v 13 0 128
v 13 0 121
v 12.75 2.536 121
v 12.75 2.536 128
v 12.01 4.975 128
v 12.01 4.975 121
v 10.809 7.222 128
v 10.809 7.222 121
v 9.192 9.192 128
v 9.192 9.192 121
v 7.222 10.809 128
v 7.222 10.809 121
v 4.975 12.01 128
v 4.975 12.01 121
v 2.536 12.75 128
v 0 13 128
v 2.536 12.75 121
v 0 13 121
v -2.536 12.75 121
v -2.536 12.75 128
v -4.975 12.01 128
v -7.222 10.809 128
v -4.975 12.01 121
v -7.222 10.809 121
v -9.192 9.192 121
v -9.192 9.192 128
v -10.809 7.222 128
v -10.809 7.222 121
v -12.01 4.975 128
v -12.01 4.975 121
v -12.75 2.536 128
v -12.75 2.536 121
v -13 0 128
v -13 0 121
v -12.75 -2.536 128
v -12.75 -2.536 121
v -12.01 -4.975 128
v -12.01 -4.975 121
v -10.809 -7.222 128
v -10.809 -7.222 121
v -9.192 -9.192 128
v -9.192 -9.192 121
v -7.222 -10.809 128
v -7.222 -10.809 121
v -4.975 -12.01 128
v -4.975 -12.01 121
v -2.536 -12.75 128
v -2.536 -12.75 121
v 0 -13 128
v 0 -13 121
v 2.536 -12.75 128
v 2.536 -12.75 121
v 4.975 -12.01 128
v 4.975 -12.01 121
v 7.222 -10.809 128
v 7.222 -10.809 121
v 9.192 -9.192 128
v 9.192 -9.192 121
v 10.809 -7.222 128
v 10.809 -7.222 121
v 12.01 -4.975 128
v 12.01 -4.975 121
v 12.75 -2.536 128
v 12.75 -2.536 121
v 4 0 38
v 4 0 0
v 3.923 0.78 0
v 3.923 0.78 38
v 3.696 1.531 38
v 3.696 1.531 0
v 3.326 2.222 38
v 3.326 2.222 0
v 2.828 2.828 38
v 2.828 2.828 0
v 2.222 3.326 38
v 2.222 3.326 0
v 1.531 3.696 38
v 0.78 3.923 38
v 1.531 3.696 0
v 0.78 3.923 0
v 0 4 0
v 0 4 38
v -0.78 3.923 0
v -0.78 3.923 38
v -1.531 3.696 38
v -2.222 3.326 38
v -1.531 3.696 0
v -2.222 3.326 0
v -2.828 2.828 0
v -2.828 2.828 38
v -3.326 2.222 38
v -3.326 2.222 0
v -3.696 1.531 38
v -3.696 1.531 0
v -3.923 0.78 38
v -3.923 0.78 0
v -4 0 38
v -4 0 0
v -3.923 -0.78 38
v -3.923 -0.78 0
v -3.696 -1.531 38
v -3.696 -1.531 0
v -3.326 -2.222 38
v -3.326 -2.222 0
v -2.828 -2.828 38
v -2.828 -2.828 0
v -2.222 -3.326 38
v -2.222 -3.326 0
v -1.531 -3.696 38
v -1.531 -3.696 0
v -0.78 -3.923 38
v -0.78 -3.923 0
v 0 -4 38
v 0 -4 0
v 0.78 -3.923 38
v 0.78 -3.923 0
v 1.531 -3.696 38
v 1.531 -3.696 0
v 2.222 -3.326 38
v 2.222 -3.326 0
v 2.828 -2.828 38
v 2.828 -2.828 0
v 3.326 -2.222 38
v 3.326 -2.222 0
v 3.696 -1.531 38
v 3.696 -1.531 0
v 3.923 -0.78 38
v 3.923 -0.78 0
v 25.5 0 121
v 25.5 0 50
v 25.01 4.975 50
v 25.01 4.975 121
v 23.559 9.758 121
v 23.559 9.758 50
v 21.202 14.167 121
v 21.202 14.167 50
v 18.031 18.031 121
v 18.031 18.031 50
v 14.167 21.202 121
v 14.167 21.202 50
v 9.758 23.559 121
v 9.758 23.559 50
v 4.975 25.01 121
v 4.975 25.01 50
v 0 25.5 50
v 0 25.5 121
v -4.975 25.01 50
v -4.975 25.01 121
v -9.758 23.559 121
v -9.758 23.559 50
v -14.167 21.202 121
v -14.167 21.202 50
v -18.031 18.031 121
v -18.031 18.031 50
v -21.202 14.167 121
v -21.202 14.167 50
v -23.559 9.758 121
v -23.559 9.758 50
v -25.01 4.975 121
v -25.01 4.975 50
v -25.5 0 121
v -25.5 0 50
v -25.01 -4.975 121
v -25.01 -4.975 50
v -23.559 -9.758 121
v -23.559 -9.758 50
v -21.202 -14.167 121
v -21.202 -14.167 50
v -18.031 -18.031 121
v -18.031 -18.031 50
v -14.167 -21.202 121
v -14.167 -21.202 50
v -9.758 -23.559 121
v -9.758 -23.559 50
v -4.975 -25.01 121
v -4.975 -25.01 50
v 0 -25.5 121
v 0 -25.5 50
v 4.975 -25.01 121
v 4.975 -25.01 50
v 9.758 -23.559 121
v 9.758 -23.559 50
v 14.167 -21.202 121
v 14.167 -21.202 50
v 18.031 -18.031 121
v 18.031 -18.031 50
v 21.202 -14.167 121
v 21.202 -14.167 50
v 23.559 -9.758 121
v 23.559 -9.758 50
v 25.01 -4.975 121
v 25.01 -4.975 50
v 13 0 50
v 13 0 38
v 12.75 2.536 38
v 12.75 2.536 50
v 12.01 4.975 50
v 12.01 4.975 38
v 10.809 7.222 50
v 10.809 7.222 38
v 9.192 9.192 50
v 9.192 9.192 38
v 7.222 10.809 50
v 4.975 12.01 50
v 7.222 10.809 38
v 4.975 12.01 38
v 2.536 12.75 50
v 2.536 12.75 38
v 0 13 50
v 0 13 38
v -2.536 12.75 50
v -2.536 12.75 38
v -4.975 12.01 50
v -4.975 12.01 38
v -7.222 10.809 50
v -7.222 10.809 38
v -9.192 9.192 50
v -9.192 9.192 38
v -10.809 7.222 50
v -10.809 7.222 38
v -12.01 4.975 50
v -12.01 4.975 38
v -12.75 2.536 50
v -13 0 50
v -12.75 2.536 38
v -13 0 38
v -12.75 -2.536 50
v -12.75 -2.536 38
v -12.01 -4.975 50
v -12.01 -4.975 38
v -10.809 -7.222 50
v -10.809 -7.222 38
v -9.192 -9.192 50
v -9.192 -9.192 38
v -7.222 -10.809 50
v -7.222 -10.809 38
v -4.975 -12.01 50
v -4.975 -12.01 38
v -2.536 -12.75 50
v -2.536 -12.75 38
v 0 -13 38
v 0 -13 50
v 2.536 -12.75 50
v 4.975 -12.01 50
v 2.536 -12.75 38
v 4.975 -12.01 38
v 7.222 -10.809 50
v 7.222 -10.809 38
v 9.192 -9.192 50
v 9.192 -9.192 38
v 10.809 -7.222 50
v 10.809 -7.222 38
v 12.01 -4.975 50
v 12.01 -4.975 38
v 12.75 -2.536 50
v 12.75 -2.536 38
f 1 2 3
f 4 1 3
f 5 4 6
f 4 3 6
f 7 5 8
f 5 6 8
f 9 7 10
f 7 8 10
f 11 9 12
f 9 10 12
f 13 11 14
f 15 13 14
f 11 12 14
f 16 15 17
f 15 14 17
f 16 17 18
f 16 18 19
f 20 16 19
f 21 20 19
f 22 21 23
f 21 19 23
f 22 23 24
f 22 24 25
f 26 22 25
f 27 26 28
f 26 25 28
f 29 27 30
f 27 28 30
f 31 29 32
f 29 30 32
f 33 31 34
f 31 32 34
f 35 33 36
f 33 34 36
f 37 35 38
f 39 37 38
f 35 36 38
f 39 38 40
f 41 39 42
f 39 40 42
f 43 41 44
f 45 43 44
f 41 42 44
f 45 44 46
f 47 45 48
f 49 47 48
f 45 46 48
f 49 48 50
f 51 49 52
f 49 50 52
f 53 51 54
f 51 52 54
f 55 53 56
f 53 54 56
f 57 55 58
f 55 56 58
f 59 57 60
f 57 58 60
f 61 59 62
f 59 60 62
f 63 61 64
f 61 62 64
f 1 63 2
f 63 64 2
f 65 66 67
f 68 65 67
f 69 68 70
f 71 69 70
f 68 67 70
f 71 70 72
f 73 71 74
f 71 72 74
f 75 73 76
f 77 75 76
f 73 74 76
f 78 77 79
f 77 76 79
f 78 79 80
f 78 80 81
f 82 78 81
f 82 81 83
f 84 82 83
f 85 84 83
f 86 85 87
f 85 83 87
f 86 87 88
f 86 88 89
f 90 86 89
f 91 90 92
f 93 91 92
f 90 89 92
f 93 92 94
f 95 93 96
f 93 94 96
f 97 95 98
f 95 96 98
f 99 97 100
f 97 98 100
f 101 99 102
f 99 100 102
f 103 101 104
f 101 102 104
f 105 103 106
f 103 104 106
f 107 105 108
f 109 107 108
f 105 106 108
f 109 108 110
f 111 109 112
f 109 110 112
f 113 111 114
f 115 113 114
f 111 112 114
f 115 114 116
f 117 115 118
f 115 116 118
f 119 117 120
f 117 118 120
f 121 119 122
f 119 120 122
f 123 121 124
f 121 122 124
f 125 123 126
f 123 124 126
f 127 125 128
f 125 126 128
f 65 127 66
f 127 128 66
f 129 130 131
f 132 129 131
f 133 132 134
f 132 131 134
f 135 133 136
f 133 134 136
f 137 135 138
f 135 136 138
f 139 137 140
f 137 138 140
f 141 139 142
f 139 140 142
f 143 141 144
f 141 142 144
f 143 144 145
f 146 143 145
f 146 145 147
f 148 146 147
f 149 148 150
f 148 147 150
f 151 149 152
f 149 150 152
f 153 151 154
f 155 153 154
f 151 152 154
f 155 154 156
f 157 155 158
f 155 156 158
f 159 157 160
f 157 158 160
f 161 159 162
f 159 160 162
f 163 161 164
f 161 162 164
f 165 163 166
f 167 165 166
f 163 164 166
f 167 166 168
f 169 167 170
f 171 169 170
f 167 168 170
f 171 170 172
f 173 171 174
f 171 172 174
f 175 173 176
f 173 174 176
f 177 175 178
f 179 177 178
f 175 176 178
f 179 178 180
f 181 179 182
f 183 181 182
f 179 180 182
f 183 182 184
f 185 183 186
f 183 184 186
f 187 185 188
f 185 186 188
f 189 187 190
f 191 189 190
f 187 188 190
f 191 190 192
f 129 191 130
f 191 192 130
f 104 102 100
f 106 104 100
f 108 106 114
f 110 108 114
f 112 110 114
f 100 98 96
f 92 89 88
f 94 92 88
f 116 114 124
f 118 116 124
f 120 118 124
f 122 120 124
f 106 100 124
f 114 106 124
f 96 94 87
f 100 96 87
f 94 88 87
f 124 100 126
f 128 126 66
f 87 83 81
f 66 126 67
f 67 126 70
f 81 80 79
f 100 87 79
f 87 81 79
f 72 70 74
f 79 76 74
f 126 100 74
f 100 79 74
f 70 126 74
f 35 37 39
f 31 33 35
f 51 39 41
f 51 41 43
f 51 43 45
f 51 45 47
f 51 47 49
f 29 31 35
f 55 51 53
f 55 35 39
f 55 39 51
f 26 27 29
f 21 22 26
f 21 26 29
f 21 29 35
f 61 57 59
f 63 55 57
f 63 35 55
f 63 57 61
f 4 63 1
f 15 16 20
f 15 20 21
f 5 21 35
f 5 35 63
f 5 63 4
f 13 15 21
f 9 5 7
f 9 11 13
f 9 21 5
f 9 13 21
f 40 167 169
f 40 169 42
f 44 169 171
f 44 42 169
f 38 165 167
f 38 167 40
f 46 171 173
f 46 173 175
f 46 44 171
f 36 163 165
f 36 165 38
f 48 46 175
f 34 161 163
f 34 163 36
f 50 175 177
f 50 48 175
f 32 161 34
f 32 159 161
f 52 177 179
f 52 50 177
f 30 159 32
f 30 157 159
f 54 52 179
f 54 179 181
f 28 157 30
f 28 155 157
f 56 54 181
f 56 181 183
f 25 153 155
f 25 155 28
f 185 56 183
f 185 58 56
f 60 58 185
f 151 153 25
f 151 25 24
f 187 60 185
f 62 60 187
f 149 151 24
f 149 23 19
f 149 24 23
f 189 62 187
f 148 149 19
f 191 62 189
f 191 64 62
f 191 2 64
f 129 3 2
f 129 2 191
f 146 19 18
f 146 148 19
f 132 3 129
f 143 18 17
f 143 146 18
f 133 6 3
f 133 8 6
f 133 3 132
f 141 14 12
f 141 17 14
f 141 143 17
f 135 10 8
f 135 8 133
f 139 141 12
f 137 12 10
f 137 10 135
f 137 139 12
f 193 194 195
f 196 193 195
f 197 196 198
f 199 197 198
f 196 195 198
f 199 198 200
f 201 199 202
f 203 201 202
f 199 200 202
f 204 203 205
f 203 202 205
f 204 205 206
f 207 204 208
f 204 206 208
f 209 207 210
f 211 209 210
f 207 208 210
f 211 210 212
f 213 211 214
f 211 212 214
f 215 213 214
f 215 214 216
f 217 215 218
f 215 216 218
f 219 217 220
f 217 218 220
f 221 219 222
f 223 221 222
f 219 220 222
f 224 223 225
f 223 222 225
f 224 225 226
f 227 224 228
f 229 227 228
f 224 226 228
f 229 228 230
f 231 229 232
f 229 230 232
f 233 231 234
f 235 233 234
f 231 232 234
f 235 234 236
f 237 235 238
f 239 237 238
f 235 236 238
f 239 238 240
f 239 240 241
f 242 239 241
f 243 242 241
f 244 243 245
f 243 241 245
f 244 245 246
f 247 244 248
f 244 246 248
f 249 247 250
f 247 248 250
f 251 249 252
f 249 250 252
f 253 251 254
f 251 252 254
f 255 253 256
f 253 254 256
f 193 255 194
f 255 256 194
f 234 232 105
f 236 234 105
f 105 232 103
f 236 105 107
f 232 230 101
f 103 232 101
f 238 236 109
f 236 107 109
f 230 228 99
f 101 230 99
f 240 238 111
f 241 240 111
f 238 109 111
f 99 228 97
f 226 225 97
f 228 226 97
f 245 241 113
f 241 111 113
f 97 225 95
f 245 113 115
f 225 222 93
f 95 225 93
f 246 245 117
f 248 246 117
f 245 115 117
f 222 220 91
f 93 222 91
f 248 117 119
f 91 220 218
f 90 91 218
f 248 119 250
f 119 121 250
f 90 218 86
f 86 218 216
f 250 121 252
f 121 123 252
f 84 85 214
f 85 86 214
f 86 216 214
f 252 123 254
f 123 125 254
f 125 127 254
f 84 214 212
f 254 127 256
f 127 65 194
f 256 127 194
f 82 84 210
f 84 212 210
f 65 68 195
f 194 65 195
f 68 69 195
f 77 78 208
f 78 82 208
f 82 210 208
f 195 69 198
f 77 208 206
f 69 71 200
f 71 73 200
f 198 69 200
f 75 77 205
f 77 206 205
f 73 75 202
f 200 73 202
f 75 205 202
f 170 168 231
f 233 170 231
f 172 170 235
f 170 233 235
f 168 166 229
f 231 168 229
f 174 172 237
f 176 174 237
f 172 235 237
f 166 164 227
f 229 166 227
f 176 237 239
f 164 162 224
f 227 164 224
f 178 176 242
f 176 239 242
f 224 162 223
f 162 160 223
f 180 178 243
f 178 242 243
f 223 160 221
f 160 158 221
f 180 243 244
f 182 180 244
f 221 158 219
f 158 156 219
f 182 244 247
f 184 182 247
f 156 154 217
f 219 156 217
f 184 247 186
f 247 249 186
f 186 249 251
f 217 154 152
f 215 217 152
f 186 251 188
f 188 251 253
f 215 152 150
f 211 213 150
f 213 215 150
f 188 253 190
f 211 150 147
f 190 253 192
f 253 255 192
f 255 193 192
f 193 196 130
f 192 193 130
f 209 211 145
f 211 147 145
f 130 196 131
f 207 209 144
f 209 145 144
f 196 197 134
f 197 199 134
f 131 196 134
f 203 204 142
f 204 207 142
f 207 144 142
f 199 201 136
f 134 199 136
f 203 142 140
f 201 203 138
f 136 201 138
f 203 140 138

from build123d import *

# Parameters (mm, degrees)
F0_R     = 4
F1_DEPTH = 38
F2_R     = 13
F2_R_2   = 4
F3_DEPTH = 12
F4_R     = 25.5
F4_R_2   = 13
F5_DEPTH = 71
F6_R     = 13
F7_DEPTH = 7


with BuildPart() as f1:
    # F0 (on Top) → F1 (new body)
    with BuildSketch(Plane.XY):
        Circle(F0_R)
    extrude(amount=F1_DEPTH)

    # F2 (on face) → F3 (join)
    with BuildSketch(Plane.XY.offset(38)):
        Circle(F2_R)
        Circle(F2_R_2, mode=Mode.SUBTRACT)
        Circle(F2_R_2)
    extrude(amount=F3_DEPTH)

    # F4 (on face) → F5 (join)
    with BuildSketch(Plane.XY.offset(50)):
        Circle(F4_R)
        Circle(F4_R_2, mode=Mode.SUBTRACT)
        Circle(F4_R_2)
    extrude(amount=F5_DEPTH)

    # F6 (on face) → F7 (join)
    with BuildSketch(Plane.XY.offset(121)):
        Circle(F6_R)
    extrude(amount=F7_DEPTH)


solid = f1.part
